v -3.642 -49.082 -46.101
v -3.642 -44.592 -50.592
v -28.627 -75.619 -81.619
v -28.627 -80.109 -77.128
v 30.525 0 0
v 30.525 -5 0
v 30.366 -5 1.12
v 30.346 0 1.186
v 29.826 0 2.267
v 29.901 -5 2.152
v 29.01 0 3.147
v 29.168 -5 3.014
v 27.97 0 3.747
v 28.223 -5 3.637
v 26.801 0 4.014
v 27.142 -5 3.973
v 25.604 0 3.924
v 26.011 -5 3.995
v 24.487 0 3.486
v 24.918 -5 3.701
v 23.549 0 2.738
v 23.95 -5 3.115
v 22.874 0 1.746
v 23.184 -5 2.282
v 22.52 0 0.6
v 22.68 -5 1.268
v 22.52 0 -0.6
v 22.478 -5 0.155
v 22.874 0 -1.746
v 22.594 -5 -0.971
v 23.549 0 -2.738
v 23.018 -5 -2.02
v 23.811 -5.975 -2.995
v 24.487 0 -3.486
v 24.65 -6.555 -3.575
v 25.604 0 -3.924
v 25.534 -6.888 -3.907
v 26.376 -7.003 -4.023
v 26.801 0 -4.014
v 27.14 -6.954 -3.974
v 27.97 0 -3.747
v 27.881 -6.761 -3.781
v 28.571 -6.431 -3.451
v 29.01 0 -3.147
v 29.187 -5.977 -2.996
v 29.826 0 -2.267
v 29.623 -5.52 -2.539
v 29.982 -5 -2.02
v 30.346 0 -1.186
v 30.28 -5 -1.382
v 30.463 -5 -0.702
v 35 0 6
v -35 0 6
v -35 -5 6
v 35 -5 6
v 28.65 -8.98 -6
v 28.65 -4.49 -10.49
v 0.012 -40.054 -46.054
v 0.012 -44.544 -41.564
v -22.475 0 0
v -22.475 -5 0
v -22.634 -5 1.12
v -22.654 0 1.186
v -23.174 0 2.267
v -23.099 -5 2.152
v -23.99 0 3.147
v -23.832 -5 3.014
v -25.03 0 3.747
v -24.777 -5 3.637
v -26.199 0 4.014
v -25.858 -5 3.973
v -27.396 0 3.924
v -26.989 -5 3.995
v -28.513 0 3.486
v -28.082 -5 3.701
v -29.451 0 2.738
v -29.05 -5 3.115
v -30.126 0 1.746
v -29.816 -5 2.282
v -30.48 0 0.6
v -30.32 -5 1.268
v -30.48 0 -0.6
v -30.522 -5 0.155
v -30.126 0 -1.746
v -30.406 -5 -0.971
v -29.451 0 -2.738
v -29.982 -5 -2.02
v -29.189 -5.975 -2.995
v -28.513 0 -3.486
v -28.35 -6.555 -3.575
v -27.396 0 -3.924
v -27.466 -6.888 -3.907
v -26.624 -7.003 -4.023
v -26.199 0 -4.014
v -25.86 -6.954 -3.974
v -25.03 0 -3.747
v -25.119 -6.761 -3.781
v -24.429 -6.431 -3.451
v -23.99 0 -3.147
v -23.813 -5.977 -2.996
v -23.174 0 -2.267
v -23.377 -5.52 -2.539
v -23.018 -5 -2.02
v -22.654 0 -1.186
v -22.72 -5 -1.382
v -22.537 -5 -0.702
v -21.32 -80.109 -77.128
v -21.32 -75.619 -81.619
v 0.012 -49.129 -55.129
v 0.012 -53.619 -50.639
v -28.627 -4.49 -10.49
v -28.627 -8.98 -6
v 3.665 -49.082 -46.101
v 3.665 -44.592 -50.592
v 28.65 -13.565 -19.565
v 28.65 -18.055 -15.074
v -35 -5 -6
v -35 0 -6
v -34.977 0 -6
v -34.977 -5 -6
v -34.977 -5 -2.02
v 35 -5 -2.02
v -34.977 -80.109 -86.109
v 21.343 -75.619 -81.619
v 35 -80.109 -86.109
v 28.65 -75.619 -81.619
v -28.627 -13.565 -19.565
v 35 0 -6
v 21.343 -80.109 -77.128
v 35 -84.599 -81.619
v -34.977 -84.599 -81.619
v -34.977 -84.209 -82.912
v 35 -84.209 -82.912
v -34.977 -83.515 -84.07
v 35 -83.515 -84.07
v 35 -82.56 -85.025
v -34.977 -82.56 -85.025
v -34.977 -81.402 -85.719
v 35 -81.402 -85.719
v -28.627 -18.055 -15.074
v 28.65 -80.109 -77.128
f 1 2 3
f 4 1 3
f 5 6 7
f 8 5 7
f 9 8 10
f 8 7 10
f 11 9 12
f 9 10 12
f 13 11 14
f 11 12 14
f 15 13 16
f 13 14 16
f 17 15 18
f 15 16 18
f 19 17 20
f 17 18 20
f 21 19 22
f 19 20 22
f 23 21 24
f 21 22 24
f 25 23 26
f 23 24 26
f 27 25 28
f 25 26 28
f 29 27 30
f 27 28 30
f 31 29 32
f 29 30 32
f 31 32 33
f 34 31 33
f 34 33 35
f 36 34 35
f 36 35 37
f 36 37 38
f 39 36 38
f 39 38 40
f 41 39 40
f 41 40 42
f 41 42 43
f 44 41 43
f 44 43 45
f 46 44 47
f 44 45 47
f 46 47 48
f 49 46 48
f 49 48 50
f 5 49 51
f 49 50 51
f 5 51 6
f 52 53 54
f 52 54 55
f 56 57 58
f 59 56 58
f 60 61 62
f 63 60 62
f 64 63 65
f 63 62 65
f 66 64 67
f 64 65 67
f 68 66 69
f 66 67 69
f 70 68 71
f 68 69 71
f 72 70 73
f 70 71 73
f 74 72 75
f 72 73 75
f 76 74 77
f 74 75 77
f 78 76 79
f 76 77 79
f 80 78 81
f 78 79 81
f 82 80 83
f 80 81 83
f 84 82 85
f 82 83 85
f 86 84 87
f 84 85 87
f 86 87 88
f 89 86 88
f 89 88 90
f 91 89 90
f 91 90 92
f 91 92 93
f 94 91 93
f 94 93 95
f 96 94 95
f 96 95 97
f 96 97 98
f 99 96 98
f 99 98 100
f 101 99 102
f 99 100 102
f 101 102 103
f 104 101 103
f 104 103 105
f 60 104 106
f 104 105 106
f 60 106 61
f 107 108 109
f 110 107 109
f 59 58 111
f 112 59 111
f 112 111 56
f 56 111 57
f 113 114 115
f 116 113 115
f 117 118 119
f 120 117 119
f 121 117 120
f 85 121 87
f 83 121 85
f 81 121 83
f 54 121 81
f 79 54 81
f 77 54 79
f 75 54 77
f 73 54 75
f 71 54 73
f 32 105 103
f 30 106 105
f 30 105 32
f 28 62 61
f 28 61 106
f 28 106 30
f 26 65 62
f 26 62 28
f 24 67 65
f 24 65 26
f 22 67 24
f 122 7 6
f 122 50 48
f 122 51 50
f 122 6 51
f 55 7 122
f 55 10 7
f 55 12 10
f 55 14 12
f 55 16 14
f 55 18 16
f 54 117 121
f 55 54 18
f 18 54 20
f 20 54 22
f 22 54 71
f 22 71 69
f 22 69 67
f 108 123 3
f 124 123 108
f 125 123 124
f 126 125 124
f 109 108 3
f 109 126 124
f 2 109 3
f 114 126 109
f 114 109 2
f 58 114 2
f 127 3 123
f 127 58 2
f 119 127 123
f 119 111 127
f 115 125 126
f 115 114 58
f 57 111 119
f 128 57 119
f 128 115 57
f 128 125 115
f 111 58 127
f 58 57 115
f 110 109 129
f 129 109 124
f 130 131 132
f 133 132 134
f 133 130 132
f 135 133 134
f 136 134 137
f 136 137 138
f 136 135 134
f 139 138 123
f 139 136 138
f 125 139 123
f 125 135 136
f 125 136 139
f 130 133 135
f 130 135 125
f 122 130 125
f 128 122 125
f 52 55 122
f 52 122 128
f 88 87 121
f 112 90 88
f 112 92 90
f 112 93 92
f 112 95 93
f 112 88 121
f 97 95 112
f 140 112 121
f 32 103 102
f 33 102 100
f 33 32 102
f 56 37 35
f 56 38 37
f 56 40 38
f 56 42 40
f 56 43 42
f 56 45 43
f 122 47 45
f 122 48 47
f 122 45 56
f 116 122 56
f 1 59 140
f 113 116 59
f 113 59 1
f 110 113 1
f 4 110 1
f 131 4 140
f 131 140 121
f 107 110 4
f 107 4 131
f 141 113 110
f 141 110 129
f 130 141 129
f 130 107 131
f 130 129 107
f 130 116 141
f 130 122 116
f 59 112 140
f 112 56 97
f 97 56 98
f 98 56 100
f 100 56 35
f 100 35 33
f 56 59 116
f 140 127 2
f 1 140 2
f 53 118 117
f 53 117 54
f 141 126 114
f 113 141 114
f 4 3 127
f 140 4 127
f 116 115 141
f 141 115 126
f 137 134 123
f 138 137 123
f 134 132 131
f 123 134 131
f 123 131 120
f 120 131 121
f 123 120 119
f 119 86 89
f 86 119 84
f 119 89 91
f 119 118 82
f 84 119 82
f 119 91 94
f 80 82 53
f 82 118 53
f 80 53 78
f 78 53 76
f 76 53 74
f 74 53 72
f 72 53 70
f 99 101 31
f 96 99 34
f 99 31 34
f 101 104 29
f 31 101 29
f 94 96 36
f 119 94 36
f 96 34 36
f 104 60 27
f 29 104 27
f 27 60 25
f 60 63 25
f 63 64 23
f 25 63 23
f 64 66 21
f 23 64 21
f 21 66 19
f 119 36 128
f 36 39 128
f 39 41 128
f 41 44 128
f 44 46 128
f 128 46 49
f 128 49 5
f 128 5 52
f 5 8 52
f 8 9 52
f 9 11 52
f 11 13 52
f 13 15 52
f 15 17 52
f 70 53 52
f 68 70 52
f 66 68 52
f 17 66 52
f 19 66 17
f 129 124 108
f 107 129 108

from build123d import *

# Parameters (mm, degrees)
F0_W     = 70
F0_H     = 12
F1_DEPTH = 5
F2_R     = 4.025
F3_DEPTH = 25.4
F5_DEPTH = 69.977
F6_R     = 4.025
F7_DEPTH = 25.4
F9_DEPTH = 25.4


with BuildPart() as f1:
    # F0 (on Front) → F1 (new body)
    with BuildSketch(Plane.XZ):
        Rectangle(F0_W, F0_H)
    extrude(amount=F1_DEPTH)

    # F2 (on face) → F3 (cut)
    with BuildSketch(Plane.XZ.offset(5)):
        with Locations((-26.5, 0)):
            Circle(F2_R)
        with Locations((26.5, 0)):
            Circle(F2_R)
    extrude(amount=-F3_DEPTH, mode=Mode.SUBTRACT)

    # F4 (on face) → F5 (join)
    with BuildSketch(Plane.YZ.offset(35)):
        with BuildLine():
            Line((-80.10874, -86.10874), (0, -6))
            Line((0, -6), (-5, -6))
            Line((-5, -6), (-5, -2.019744))
            Line((-5, -2.019744), (-84.598868, -81.618612))
            ThreePointArc((-84.598868, -81.618612), (-83.067369, -84.577241), (-80.10874, -86.10874))
        make_face()
    extrude(amount=-F5_DEPTH)

    # F6 (on face) → F7 (cut)
    with BuildSketch(Plane(origin=(0, 0, 0), x_dir=(-1, 0, 0), z_dir=(0, 1, 0))):
        with Locations((26.5, 0)):
            Circle(F6_R)
        with Locations((-26.5, 0)):
            Circle(F6_R)
    extrude(amount=-F7_DEPTH, mode=Mode.SUBTRACT)

    # F8 (on face) → F9 (cut)
    with BuildSketch(Plane(origin=(0, 3, -3), x_dir=(-1, 0, 0), z_dir=(0, 0.707107, -0.707107))):
        Polygon((-3.665127, -67.304638), (-28.65, -23.425769), (-28.65, -111.183507), align=None)
        Polygon((-0.0115, -60.888074), (28.627, -10.592641), (-28.65, -10.592641), align=None)
        Polygon((28.627, -111.183507), (28.627, -23.425769), (3.642127, -67.304638), align=None)
        Polygon((-21.342745, -111.183507), (21.319745, -111.183507), (-0.0115, -73.721202), align=None)
    extrude(amount=-F9_DEPTH, mode=Mode.SUBTRACT)


solid = f1.part
